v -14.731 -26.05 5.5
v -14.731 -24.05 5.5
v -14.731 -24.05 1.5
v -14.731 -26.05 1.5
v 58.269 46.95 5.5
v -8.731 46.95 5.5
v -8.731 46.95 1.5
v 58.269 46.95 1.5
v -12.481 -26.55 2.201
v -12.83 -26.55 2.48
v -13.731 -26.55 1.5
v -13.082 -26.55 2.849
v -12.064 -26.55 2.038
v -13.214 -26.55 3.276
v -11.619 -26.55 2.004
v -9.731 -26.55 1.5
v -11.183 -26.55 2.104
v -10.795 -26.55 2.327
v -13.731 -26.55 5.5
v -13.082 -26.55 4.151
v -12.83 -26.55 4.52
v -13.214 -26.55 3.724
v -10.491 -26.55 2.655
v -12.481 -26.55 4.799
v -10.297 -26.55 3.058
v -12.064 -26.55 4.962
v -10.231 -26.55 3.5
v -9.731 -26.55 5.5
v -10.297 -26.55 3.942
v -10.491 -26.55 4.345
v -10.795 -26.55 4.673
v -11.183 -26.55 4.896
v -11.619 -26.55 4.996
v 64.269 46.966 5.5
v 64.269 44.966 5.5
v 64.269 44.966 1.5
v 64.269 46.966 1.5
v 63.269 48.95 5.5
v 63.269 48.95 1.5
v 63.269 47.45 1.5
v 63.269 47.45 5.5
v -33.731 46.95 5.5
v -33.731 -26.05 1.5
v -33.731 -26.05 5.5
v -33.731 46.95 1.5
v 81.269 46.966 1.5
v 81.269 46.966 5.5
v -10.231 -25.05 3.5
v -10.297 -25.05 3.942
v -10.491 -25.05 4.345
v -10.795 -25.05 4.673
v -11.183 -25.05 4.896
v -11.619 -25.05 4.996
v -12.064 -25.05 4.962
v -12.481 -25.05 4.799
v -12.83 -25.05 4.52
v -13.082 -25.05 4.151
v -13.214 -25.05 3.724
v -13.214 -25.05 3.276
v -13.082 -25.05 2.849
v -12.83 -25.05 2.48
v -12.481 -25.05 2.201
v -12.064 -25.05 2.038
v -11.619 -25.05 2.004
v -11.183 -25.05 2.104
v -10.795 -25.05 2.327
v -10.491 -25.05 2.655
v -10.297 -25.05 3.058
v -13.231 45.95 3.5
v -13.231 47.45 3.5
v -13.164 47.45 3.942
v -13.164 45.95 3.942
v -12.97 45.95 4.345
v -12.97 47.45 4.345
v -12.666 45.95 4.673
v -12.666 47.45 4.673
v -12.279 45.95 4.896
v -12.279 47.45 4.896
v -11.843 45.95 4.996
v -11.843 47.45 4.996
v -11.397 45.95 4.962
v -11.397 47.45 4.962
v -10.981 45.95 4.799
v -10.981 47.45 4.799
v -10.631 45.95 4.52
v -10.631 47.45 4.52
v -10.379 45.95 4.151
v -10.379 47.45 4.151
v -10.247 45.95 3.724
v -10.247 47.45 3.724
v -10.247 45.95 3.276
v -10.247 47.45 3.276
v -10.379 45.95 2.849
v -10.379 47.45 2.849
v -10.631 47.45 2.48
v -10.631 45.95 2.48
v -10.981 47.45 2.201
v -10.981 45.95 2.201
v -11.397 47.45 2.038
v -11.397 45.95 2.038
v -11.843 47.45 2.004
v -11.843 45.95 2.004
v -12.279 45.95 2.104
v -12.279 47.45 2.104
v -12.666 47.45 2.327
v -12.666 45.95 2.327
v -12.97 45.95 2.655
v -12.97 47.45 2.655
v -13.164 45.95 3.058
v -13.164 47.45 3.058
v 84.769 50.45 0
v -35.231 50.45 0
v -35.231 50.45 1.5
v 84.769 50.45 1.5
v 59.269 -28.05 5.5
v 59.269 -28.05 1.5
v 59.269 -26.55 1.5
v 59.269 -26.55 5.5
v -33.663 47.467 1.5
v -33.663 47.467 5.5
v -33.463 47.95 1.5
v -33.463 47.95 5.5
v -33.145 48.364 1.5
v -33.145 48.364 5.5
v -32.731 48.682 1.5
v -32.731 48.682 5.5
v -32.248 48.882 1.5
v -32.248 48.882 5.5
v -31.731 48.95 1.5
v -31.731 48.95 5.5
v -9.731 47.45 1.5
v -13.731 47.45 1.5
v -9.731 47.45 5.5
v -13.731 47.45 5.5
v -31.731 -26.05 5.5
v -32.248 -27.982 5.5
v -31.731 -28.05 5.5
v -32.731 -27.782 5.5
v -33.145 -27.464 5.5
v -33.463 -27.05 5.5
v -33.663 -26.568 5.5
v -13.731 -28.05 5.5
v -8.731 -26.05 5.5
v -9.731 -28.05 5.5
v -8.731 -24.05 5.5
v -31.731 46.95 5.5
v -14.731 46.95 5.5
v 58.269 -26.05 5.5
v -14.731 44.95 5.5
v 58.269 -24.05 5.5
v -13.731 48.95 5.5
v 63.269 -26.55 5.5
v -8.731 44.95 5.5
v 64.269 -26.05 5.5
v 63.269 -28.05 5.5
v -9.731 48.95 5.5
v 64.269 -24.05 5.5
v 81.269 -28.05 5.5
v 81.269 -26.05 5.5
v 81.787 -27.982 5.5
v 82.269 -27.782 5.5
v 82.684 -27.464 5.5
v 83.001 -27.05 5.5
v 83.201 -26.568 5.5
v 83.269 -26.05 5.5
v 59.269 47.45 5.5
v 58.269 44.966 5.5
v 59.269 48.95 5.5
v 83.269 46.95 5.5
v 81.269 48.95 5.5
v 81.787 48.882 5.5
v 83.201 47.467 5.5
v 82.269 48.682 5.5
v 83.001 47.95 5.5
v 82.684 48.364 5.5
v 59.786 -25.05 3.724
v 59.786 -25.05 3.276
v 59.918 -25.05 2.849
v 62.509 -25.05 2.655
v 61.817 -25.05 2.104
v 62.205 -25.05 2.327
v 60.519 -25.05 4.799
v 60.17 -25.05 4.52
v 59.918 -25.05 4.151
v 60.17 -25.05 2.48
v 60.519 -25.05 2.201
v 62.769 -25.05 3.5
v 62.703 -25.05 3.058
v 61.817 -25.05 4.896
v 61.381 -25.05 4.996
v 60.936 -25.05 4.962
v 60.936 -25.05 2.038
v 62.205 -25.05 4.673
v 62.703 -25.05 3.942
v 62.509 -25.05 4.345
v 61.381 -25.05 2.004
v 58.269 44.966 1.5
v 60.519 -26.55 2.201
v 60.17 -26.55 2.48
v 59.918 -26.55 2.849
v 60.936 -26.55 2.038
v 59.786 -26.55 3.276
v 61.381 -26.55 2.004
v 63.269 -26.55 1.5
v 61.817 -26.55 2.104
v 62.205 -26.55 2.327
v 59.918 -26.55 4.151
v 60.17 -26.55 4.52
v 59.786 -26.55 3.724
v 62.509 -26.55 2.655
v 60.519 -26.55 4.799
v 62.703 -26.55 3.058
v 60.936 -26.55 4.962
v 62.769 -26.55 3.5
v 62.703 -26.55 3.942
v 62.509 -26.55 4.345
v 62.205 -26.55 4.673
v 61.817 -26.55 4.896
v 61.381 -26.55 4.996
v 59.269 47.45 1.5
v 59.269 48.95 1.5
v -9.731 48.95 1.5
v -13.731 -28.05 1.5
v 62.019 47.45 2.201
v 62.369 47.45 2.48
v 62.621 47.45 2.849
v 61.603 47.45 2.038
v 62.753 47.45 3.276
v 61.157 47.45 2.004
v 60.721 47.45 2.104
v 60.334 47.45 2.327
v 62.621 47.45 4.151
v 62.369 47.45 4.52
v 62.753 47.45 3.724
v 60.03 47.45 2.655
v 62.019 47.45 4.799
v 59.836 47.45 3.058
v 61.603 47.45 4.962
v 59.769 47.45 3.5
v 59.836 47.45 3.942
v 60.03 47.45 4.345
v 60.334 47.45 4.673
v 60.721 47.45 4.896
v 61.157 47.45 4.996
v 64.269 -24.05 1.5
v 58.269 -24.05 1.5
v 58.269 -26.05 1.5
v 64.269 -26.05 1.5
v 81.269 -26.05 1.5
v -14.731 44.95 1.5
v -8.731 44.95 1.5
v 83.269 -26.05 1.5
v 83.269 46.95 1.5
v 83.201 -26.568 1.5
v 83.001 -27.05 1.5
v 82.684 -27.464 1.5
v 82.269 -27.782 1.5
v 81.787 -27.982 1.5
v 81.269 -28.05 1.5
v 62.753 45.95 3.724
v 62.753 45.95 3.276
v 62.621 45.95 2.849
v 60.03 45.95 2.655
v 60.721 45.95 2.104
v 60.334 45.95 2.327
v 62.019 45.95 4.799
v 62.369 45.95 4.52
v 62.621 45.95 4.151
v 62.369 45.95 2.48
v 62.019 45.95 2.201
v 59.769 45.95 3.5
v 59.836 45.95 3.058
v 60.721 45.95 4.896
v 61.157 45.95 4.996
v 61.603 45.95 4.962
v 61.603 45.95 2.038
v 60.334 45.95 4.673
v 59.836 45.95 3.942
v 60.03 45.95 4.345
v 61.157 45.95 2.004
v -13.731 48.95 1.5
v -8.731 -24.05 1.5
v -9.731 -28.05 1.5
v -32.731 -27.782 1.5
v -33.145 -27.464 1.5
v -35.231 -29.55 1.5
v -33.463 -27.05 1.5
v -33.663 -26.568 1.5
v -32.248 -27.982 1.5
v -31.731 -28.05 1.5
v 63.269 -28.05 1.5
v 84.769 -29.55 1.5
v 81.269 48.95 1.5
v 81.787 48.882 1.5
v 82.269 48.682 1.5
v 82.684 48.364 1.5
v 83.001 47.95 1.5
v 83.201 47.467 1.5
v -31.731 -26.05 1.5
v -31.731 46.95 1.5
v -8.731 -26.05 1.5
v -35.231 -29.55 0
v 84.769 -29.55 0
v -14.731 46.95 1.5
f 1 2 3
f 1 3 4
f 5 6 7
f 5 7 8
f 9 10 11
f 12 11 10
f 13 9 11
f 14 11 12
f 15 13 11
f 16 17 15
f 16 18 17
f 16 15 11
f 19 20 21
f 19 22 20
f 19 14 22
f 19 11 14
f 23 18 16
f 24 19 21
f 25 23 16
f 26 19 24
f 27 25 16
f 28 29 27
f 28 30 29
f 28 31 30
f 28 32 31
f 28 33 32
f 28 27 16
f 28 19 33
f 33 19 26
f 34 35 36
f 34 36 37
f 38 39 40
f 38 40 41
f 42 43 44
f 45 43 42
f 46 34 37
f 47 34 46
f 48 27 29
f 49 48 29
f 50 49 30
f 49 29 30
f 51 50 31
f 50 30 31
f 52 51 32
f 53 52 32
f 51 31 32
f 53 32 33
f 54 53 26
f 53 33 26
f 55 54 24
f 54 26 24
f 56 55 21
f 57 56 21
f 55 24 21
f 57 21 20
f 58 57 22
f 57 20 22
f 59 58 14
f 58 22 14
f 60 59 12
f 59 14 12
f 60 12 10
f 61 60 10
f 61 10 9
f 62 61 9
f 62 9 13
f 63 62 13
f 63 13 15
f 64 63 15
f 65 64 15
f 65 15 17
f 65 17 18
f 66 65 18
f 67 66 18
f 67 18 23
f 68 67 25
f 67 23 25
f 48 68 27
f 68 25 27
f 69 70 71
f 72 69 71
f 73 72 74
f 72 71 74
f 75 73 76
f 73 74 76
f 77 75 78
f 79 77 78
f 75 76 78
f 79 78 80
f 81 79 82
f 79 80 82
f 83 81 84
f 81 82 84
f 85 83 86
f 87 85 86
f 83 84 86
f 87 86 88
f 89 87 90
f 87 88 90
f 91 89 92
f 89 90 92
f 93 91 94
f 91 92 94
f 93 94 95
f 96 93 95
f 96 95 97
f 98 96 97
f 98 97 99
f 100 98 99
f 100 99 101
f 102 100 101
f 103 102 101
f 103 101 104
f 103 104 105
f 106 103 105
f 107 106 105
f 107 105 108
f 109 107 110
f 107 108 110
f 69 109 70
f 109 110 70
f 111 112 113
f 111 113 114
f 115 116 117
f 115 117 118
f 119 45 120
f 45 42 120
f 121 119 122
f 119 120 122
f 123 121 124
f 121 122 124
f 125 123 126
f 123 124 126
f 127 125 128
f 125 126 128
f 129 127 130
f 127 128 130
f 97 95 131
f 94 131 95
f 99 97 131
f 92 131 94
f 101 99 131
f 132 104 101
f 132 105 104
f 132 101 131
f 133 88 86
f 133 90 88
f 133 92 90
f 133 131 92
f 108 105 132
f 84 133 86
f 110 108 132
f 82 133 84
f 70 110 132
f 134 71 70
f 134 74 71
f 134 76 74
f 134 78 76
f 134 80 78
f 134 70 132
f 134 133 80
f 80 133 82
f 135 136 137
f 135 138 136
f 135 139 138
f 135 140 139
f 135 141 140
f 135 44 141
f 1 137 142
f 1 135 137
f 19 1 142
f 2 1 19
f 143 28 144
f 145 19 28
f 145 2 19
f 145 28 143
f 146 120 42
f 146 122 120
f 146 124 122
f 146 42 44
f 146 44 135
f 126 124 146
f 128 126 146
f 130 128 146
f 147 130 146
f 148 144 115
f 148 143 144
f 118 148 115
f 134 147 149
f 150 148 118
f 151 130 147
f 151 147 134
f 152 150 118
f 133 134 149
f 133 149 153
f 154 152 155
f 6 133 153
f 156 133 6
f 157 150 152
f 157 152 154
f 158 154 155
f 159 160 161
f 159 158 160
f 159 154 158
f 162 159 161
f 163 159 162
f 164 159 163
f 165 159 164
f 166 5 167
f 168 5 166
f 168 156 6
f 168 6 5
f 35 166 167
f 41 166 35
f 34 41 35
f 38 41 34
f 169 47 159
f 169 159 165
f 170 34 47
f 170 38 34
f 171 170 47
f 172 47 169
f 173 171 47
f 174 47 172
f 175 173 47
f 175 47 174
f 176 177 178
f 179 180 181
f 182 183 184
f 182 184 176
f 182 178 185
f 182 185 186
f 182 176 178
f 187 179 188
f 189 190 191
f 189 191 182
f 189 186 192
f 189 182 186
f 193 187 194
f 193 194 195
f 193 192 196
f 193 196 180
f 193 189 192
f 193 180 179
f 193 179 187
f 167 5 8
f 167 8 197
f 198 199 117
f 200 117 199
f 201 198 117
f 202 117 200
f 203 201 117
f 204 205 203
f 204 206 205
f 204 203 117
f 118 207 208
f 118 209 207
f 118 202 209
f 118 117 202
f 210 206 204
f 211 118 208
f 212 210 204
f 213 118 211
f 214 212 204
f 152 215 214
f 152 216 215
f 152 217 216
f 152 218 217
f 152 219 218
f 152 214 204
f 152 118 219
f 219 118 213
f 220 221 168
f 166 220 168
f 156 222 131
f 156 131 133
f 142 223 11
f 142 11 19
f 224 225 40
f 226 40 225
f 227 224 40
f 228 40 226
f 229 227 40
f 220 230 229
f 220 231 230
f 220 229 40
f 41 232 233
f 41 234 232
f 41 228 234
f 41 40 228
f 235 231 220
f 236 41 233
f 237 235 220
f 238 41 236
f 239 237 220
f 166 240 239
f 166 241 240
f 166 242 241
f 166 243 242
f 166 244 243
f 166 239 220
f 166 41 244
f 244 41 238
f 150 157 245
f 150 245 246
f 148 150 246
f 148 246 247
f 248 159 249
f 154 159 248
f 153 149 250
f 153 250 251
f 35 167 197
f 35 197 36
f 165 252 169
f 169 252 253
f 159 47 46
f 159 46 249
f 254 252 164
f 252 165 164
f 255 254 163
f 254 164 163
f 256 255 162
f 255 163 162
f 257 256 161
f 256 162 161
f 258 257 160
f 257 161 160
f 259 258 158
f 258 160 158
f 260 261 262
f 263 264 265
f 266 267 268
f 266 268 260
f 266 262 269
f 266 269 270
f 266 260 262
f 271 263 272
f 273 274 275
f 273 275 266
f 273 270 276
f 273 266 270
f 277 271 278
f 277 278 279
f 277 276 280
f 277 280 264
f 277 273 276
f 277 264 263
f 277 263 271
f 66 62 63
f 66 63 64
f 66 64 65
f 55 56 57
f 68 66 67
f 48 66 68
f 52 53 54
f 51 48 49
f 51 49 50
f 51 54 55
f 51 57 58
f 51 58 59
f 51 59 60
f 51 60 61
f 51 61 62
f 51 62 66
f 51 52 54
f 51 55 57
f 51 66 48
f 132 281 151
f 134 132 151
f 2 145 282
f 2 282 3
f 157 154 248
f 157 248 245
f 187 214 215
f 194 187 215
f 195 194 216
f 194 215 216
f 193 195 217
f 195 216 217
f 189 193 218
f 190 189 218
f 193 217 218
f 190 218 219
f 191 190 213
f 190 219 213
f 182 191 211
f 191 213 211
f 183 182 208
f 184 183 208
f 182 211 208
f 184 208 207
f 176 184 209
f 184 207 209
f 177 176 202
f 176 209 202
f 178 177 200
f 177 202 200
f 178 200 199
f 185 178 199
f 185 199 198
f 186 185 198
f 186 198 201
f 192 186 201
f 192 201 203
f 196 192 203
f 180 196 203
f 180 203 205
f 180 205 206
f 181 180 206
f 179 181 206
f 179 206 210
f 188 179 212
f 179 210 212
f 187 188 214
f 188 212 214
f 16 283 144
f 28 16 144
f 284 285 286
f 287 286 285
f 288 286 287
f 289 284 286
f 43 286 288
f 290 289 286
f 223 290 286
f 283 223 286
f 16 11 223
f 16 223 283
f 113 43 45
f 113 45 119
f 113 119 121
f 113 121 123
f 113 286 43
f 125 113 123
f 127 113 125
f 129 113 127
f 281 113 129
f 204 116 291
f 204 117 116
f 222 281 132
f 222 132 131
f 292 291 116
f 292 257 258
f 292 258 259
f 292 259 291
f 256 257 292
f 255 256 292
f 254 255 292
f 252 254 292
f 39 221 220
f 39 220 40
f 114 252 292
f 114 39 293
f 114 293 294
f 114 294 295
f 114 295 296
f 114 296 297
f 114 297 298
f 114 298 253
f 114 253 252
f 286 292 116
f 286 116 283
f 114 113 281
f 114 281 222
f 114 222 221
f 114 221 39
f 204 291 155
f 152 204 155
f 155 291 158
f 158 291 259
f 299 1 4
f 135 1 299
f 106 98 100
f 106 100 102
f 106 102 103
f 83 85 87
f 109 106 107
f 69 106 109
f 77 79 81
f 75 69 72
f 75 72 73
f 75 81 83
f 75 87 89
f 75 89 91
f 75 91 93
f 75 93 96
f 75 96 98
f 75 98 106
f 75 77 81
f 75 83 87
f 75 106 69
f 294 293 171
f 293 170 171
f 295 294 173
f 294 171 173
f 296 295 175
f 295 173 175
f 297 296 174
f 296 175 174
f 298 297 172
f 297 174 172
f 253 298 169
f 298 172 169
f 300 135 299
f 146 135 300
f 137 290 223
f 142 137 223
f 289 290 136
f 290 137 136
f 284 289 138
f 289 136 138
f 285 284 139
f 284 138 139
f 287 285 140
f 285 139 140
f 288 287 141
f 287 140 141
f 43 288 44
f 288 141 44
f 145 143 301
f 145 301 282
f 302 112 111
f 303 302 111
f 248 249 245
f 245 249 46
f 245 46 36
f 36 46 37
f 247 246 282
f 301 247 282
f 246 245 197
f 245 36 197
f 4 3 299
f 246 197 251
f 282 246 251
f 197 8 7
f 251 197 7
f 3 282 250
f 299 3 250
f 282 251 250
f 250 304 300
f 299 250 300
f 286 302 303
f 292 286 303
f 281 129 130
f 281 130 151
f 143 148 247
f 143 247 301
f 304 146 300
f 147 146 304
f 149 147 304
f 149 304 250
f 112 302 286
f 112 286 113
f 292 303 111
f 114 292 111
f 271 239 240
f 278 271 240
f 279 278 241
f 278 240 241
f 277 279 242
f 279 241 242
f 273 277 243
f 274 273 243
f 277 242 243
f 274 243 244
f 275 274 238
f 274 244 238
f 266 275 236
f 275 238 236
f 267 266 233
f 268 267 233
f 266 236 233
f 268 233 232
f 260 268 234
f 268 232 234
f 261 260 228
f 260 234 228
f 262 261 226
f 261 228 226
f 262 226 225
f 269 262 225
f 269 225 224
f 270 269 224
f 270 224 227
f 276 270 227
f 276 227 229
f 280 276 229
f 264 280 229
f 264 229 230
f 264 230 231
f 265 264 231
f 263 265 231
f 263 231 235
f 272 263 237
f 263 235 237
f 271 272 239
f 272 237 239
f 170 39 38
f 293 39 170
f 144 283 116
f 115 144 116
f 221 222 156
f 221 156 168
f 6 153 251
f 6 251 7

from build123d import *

# Parameters (mm, degrees)
SKETCH_W        = 120
SKETCH_H        = 80
PAD_DEPTH       = 1.5
SKETCH001_W     = 117
SKETCH001_H     = 77
PAD001_DEPTH    = 4
POCKET_DEPTH    = 4
SKETCH003_W     = 4
SKETCH003_H     = 4
POCKET001_DEPTH = 1.5
SKETCH004_W     = 4
SKETCH004_H     = 4
POCKET002_DEPTH = 1.5
FILLET_R        = 2
FILLET001_R     = 2
FILLET002_R     = 2
FILLET003_R     = 2
SKETCH005_R     = 1.5
POCKET003_DEPTH = 1.5
SKETCH006_R     = 1.5
POCKET004_DEPTH = 1.5
SKETCH007_R     = 1.5
POCKET005_DEPTH = 1.5
SKETCH008_R     = 1.5
POCKET006_DEPTH = 1.5


with BuildPart() as part:
    # Sketch → Pad (new body)
    with BuildSketch(Plane.XY):
        with Locations((24.76931, 10.449721)):
            Rectangle(SKETCH_W, SKETCH_H)
    extrude(amount=PAD_DEPTH)

    # Sketch001 (on Face6 of Pad) → Pad001 (join)
    with BuildSketch(Plane.XY.offset(1.5)):
        with Locations((24.76931, 10.449721)):
            Rectangle(SKETCH001_W, SKETCH001_H)
    extrude(amount=PAD001_DEPTH)

    # Sketch002 (on Face11 of Pad001) → Pocket (cut)
    with BuildSketch(Plane.XY.offset(5.5)):
        Polygon((81.26931, 46.966207), (81.26931, -26.050279), (64.26931, -26.050279), (64.26931, -24.050279), (58.26931, -24.050279), (58.26931, -26.050279), (-8.73069, -26.050279), (-8.73069, -24.050279), (-14.73069, -24.050279), (-14.73069, -26.050279), (-31.73069, -26.050279), (-31.73069, 46.949721), (-14.73069, 46.949721), (-14.73069, 44.949721), (-8.73069, 44.949721), (-8.73069, 46.949721), (58.26931, 46.949721), (58.26931, 44.966207), (64.26931, 44.966207), (64.26931, 46.966207), align=None)
    extrude(amount=-POCKET_DEPTH, mode=Mode.SUBTRACT)

    # Sketch003 (on Face9 of Pocket) → Pocket001 (cut)
    with BuildSketch(Plane.XZ.offset(28.050279)):
        with Locations((-11.73069, 3.5)):
            Rectangle(SKETCH003_W, SKETCH003_H)
        with Locations((61.26931, 3.5)):
            Rectangle(SKETCH003_W, SKETCH003_H)
    extrude(amount=-POCKET001_DEPTH, mode=Mode.SUBTRACT)

    # Sketch004 (on Face7 of Pocket001) → Pocket002 (cut)
    with BuildSketch(Plane(origin=(0, 48.949721, 0), x_dir=(-1, 0, 0), z_dir=(0, 1, 0))):
        with Locations((-61.26931, 3.5)):
            Rectangle(SKETCH004_W, SKETCH004_H)
        with Locations((11.73069, 3.5)):
            Rectangle(SKETCH004_W, SKETCH004_H)
    extrude(amount=-POCKET002_DEPTH, mode=Mode.SUBTRACT)

    # Fillet
    fillet_edges = [part.edges().sort_by_distance(p)[0] for p in [
        (-33.73069, 48.949721, 3.5),
    ]]
    fillet(fillet_edges, radius=FILLET_R)

    # Fillet001
    fillet001_edges = [part.edges().sort_by_distance(p)[0] for p in [
        (83.26931, 48.949721, 3.5),
    ]]
    fillet(fillet001_edges, radius=FILLET001_R)

    # Fillet002
    fillet002_edges = [part.edges().sort_by_distance(p)[0] for p in [
        (83.26931, -28.050279, 3.5),
    ]]
    fillet(fillet002_edges, radius=FILLET002_R)

    # Fillet003
    fillet003_edges = [part.edges().sort_by_distance(p)[0] for p in [
        (-33.73069, -28.050279, 3.5),
    ]]
    fillet(fillet003_edges, radius=FILLET003_R)

    # Sketch005 (on Face25 of Fillet003) → Pocket003 (cut)
    with BuildSketch(Plane.XZ.offset(26.550279)):
        with Locations((-11.73069, 3.5)):
            Circle(SKETCH005_R)
    extrude(amount=-POCKET003_DEPTH, mode=Mode.SUBTRACT)

    # Sketch006 (on Face28 of Pocket003) → Pocket004 (cut)
    with BuildSketch(Plane.XZ.offset(26.550279)):
        with Locations((61.26931, 3.5)):
            Circle(SKETCH006_R)
    extrude(amount=-POCKET004_DEPTH, mode=Mode.SUBTRACT)

    # Sketch007 (on Face34 of Pocket004) → Pocket005 (cut)
    with BuildSketch(Plane(origin=(0, 47.449721, 0), x_dir=(-1, 0, 0), z_dir=(0, 1, 0))):
        with Locations((-61.26931, 3.5)):
            Circle(SKETCH007_R)
    extrude(amount=-POCKET005_DEPTH, mode=Mode.SUBTRACT)

    # Sketch008 (on Face31 of Pocket005) → Pocket006 (cut)
    with BuildSketch(Plane(origin=(0, 47.449721, 0), x_dir=(-1, 0, 0), z_dir=(0, 1, 0))):
        with Locations((11.73069, 3.5)):
            Circle(SKETCH008_R)
    extrude(amount=-POCKET006_DEPTH, mode=Mode.SUBTRACT)


solid = part.part
